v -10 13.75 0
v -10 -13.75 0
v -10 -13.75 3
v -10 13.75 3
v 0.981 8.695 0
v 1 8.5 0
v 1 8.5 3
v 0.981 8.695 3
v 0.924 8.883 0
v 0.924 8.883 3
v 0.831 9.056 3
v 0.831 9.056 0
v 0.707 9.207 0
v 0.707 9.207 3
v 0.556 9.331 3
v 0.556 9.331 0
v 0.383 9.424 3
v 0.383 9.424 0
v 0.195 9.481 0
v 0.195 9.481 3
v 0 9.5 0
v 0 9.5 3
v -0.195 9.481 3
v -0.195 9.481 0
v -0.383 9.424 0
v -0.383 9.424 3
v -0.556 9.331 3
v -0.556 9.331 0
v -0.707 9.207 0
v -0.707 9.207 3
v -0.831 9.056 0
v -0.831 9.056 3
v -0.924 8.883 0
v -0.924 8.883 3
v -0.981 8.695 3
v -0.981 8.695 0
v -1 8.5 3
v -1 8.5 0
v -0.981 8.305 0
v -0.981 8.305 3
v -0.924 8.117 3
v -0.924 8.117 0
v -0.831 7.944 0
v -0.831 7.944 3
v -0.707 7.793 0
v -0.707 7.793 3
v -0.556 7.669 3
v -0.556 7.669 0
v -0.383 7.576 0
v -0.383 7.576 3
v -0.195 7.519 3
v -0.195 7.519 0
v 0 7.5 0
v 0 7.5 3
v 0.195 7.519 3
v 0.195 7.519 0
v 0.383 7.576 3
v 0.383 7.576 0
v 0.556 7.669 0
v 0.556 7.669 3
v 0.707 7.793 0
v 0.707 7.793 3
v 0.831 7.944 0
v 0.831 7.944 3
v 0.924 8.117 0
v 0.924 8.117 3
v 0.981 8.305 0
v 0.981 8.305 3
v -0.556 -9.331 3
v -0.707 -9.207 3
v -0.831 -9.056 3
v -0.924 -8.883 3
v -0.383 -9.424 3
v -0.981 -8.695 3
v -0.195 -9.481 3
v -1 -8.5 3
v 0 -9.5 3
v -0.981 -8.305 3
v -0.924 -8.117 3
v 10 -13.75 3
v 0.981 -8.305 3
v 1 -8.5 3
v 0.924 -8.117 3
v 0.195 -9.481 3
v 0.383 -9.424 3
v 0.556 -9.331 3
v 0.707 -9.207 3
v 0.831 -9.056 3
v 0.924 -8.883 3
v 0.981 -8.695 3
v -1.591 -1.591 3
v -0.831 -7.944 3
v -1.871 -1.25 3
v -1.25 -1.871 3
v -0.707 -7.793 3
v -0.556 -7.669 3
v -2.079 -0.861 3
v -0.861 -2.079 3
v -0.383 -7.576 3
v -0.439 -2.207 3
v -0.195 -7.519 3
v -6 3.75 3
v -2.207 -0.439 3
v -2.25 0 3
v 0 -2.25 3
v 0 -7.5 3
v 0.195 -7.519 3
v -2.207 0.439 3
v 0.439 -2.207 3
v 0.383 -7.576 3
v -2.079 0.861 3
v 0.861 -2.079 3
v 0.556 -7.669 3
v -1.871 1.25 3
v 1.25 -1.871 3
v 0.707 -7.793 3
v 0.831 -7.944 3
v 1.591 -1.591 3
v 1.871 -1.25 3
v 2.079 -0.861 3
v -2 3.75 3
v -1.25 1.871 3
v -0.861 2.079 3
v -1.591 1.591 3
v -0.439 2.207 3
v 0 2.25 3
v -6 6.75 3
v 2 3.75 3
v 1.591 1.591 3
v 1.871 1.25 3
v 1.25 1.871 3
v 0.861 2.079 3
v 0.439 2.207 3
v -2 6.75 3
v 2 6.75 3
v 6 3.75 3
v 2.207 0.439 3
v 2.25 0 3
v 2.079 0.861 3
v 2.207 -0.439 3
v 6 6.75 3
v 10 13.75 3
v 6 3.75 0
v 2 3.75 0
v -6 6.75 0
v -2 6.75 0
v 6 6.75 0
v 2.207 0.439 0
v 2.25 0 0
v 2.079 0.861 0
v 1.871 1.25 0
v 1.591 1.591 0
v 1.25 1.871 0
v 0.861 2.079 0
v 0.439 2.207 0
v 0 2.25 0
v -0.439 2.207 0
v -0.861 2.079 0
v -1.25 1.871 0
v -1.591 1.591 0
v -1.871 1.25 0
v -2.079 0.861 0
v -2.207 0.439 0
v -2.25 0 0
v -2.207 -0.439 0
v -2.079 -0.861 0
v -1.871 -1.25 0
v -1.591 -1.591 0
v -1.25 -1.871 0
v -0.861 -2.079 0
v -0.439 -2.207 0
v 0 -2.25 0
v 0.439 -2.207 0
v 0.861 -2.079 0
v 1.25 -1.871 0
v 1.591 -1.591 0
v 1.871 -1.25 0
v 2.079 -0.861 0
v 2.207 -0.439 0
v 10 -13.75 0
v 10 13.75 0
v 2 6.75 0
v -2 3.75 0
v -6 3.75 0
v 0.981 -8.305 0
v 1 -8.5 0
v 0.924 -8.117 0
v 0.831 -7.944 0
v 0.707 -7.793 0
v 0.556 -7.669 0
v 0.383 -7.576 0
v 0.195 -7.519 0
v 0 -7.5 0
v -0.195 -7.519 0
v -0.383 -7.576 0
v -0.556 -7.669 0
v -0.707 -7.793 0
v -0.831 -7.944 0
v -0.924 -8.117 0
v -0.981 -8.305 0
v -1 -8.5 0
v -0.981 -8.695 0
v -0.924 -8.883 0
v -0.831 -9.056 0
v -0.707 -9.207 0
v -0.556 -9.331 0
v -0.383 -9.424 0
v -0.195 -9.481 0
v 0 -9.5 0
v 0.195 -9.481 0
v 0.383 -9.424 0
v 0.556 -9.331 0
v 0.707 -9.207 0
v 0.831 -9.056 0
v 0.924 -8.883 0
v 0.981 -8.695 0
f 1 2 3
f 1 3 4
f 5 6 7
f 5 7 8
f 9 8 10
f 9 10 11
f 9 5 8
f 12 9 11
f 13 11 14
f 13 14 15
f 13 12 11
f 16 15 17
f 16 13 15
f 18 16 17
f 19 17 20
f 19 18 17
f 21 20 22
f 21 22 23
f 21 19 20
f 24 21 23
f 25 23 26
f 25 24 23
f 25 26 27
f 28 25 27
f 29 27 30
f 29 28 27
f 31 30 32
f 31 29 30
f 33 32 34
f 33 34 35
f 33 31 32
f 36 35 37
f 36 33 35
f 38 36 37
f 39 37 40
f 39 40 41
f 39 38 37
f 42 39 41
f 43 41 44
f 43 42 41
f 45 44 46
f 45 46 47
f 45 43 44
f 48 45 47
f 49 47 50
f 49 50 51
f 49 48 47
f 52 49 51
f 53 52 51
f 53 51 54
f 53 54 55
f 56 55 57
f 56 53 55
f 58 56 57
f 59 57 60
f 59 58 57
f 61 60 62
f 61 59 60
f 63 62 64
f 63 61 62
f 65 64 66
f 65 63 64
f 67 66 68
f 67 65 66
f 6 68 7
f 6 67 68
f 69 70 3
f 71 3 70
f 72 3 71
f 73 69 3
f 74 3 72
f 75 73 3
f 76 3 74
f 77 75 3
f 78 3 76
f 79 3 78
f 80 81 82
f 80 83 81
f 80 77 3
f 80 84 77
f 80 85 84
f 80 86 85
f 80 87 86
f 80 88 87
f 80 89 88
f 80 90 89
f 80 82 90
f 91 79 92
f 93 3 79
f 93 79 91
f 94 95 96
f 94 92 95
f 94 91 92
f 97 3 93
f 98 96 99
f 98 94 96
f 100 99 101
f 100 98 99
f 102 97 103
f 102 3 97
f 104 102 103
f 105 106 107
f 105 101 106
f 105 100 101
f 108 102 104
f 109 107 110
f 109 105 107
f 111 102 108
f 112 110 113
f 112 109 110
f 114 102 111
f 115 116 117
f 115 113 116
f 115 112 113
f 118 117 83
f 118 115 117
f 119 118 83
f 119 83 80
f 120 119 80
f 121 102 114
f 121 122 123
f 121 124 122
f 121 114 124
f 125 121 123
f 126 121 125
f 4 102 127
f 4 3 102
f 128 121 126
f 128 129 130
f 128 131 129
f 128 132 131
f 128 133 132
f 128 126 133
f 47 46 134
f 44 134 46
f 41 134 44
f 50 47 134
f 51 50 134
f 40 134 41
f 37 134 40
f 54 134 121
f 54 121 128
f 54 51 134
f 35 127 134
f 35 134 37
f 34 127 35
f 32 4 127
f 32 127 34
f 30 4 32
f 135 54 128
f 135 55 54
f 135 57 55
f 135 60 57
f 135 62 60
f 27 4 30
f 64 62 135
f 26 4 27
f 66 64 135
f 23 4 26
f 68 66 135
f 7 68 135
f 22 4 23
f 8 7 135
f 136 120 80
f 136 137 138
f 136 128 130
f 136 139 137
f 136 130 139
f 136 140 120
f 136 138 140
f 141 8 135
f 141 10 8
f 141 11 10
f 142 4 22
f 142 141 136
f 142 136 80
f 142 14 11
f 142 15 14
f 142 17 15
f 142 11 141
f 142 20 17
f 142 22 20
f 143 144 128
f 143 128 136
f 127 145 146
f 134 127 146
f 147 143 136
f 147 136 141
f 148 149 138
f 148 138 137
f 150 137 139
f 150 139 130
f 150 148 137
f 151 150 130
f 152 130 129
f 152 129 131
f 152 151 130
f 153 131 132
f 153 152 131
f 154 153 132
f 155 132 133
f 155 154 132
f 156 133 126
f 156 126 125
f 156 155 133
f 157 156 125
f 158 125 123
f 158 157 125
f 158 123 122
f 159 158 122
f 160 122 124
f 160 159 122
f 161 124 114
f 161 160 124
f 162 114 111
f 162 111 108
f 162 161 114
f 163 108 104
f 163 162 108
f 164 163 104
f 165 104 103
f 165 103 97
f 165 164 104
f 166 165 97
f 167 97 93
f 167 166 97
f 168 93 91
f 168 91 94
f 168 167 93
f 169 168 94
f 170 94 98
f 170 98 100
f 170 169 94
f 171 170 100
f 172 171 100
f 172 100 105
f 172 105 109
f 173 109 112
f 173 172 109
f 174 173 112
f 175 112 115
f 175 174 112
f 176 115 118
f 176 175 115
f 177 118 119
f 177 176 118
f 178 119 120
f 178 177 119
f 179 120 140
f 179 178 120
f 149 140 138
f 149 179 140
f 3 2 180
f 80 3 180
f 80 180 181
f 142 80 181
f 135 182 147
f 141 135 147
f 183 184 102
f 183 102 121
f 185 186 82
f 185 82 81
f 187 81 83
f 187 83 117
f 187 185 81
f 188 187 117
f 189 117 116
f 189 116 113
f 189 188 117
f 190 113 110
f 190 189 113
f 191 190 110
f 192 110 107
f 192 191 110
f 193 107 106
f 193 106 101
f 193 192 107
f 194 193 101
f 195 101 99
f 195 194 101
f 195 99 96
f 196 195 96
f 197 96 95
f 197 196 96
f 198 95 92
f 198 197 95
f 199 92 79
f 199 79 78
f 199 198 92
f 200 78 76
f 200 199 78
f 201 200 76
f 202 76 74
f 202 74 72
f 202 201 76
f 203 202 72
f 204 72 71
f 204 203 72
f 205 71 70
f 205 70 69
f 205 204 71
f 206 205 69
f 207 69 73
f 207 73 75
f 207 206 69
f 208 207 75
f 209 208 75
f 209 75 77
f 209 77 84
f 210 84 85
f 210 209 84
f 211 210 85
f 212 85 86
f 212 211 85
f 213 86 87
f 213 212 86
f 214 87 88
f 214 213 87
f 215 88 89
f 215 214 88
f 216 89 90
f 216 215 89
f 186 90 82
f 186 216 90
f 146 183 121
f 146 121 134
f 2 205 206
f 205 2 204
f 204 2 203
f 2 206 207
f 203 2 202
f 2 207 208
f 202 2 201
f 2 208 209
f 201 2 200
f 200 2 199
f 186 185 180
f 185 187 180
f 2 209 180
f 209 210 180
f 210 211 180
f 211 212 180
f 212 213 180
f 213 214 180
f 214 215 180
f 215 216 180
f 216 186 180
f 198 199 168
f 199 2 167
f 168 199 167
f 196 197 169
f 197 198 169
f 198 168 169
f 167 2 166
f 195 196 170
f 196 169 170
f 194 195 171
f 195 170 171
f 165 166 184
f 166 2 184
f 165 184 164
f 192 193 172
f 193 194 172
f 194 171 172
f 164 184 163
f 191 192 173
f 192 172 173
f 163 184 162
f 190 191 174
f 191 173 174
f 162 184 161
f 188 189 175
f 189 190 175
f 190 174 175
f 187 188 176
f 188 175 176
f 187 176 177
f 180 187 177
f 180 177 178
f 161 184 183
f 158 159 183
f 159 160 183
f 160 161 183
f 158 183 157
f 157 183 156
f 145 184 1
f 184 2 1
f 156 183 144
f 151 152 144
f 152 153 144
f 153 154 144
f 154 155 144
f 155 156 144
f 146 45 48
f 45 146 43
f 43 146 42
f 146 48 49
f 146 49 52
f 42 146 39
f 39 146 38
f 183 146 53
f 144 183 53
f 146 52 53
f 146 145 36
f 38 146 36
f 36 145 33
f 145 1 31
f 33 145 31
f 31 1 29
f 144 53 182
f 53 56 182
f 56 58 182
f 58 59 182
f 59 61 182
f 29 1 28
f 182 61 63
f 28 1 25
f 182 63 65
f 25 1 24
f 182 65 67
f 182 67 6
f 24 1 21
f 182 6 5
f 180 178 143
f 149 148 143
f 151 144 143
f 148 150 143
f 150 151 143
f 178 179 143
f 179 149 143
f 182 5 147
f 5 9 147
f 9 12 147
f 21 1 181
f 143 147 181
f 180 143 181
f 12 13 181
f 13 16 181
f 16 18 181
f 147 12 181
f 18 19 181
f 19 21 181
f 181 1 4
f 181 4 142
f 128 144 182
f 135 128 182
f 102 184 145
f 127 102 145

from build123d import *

# Parameters (mm, degrees)
CROQUIS1_W              = 20
CROQUIS1_H              = 27.5
CROQUIS1_R              = 2.25
CROQUIS1_R_2            = 1
CROQUIS1_W_2            = 4
CROQUIS1_H_2            = 3
SALIENTE_EXTRUIR1_DEPTH = 3


with BuildPart() as part:
    # Croquis1 → Saliente-Extruir1 (new body)
    with BuildSketch(Plane.XY):
        Rectangle(CROQUIS1_W, CROQUIS1_H)
        Circle(CROQUIS1_R, mode=Mode.SUBTRACT)
        with Locations((0, 8.5)):
            Circle(CROQUIS1_R_2, mode=Mode.SUBTRACT)
        with Locations((0, -8.5)):
            Circle(CROQUIS1_R_2, mode=Mode.SUBTRACT)
        with Locations((4, 5.25)):
            Rectangle(CROQUIS1_W_2, CROQUIS1_H_2, mode=Mode.SUBTRACT)
        with Locations((-4, 5.25)):
            Rectangle(CROQUIS1_W_2, CROQUIS1_H_2, mode=Mode.SUBTRACT)
    extrude(amount=SALIENTE_EXTRUIR1_DEPTH)


solid = part.part
